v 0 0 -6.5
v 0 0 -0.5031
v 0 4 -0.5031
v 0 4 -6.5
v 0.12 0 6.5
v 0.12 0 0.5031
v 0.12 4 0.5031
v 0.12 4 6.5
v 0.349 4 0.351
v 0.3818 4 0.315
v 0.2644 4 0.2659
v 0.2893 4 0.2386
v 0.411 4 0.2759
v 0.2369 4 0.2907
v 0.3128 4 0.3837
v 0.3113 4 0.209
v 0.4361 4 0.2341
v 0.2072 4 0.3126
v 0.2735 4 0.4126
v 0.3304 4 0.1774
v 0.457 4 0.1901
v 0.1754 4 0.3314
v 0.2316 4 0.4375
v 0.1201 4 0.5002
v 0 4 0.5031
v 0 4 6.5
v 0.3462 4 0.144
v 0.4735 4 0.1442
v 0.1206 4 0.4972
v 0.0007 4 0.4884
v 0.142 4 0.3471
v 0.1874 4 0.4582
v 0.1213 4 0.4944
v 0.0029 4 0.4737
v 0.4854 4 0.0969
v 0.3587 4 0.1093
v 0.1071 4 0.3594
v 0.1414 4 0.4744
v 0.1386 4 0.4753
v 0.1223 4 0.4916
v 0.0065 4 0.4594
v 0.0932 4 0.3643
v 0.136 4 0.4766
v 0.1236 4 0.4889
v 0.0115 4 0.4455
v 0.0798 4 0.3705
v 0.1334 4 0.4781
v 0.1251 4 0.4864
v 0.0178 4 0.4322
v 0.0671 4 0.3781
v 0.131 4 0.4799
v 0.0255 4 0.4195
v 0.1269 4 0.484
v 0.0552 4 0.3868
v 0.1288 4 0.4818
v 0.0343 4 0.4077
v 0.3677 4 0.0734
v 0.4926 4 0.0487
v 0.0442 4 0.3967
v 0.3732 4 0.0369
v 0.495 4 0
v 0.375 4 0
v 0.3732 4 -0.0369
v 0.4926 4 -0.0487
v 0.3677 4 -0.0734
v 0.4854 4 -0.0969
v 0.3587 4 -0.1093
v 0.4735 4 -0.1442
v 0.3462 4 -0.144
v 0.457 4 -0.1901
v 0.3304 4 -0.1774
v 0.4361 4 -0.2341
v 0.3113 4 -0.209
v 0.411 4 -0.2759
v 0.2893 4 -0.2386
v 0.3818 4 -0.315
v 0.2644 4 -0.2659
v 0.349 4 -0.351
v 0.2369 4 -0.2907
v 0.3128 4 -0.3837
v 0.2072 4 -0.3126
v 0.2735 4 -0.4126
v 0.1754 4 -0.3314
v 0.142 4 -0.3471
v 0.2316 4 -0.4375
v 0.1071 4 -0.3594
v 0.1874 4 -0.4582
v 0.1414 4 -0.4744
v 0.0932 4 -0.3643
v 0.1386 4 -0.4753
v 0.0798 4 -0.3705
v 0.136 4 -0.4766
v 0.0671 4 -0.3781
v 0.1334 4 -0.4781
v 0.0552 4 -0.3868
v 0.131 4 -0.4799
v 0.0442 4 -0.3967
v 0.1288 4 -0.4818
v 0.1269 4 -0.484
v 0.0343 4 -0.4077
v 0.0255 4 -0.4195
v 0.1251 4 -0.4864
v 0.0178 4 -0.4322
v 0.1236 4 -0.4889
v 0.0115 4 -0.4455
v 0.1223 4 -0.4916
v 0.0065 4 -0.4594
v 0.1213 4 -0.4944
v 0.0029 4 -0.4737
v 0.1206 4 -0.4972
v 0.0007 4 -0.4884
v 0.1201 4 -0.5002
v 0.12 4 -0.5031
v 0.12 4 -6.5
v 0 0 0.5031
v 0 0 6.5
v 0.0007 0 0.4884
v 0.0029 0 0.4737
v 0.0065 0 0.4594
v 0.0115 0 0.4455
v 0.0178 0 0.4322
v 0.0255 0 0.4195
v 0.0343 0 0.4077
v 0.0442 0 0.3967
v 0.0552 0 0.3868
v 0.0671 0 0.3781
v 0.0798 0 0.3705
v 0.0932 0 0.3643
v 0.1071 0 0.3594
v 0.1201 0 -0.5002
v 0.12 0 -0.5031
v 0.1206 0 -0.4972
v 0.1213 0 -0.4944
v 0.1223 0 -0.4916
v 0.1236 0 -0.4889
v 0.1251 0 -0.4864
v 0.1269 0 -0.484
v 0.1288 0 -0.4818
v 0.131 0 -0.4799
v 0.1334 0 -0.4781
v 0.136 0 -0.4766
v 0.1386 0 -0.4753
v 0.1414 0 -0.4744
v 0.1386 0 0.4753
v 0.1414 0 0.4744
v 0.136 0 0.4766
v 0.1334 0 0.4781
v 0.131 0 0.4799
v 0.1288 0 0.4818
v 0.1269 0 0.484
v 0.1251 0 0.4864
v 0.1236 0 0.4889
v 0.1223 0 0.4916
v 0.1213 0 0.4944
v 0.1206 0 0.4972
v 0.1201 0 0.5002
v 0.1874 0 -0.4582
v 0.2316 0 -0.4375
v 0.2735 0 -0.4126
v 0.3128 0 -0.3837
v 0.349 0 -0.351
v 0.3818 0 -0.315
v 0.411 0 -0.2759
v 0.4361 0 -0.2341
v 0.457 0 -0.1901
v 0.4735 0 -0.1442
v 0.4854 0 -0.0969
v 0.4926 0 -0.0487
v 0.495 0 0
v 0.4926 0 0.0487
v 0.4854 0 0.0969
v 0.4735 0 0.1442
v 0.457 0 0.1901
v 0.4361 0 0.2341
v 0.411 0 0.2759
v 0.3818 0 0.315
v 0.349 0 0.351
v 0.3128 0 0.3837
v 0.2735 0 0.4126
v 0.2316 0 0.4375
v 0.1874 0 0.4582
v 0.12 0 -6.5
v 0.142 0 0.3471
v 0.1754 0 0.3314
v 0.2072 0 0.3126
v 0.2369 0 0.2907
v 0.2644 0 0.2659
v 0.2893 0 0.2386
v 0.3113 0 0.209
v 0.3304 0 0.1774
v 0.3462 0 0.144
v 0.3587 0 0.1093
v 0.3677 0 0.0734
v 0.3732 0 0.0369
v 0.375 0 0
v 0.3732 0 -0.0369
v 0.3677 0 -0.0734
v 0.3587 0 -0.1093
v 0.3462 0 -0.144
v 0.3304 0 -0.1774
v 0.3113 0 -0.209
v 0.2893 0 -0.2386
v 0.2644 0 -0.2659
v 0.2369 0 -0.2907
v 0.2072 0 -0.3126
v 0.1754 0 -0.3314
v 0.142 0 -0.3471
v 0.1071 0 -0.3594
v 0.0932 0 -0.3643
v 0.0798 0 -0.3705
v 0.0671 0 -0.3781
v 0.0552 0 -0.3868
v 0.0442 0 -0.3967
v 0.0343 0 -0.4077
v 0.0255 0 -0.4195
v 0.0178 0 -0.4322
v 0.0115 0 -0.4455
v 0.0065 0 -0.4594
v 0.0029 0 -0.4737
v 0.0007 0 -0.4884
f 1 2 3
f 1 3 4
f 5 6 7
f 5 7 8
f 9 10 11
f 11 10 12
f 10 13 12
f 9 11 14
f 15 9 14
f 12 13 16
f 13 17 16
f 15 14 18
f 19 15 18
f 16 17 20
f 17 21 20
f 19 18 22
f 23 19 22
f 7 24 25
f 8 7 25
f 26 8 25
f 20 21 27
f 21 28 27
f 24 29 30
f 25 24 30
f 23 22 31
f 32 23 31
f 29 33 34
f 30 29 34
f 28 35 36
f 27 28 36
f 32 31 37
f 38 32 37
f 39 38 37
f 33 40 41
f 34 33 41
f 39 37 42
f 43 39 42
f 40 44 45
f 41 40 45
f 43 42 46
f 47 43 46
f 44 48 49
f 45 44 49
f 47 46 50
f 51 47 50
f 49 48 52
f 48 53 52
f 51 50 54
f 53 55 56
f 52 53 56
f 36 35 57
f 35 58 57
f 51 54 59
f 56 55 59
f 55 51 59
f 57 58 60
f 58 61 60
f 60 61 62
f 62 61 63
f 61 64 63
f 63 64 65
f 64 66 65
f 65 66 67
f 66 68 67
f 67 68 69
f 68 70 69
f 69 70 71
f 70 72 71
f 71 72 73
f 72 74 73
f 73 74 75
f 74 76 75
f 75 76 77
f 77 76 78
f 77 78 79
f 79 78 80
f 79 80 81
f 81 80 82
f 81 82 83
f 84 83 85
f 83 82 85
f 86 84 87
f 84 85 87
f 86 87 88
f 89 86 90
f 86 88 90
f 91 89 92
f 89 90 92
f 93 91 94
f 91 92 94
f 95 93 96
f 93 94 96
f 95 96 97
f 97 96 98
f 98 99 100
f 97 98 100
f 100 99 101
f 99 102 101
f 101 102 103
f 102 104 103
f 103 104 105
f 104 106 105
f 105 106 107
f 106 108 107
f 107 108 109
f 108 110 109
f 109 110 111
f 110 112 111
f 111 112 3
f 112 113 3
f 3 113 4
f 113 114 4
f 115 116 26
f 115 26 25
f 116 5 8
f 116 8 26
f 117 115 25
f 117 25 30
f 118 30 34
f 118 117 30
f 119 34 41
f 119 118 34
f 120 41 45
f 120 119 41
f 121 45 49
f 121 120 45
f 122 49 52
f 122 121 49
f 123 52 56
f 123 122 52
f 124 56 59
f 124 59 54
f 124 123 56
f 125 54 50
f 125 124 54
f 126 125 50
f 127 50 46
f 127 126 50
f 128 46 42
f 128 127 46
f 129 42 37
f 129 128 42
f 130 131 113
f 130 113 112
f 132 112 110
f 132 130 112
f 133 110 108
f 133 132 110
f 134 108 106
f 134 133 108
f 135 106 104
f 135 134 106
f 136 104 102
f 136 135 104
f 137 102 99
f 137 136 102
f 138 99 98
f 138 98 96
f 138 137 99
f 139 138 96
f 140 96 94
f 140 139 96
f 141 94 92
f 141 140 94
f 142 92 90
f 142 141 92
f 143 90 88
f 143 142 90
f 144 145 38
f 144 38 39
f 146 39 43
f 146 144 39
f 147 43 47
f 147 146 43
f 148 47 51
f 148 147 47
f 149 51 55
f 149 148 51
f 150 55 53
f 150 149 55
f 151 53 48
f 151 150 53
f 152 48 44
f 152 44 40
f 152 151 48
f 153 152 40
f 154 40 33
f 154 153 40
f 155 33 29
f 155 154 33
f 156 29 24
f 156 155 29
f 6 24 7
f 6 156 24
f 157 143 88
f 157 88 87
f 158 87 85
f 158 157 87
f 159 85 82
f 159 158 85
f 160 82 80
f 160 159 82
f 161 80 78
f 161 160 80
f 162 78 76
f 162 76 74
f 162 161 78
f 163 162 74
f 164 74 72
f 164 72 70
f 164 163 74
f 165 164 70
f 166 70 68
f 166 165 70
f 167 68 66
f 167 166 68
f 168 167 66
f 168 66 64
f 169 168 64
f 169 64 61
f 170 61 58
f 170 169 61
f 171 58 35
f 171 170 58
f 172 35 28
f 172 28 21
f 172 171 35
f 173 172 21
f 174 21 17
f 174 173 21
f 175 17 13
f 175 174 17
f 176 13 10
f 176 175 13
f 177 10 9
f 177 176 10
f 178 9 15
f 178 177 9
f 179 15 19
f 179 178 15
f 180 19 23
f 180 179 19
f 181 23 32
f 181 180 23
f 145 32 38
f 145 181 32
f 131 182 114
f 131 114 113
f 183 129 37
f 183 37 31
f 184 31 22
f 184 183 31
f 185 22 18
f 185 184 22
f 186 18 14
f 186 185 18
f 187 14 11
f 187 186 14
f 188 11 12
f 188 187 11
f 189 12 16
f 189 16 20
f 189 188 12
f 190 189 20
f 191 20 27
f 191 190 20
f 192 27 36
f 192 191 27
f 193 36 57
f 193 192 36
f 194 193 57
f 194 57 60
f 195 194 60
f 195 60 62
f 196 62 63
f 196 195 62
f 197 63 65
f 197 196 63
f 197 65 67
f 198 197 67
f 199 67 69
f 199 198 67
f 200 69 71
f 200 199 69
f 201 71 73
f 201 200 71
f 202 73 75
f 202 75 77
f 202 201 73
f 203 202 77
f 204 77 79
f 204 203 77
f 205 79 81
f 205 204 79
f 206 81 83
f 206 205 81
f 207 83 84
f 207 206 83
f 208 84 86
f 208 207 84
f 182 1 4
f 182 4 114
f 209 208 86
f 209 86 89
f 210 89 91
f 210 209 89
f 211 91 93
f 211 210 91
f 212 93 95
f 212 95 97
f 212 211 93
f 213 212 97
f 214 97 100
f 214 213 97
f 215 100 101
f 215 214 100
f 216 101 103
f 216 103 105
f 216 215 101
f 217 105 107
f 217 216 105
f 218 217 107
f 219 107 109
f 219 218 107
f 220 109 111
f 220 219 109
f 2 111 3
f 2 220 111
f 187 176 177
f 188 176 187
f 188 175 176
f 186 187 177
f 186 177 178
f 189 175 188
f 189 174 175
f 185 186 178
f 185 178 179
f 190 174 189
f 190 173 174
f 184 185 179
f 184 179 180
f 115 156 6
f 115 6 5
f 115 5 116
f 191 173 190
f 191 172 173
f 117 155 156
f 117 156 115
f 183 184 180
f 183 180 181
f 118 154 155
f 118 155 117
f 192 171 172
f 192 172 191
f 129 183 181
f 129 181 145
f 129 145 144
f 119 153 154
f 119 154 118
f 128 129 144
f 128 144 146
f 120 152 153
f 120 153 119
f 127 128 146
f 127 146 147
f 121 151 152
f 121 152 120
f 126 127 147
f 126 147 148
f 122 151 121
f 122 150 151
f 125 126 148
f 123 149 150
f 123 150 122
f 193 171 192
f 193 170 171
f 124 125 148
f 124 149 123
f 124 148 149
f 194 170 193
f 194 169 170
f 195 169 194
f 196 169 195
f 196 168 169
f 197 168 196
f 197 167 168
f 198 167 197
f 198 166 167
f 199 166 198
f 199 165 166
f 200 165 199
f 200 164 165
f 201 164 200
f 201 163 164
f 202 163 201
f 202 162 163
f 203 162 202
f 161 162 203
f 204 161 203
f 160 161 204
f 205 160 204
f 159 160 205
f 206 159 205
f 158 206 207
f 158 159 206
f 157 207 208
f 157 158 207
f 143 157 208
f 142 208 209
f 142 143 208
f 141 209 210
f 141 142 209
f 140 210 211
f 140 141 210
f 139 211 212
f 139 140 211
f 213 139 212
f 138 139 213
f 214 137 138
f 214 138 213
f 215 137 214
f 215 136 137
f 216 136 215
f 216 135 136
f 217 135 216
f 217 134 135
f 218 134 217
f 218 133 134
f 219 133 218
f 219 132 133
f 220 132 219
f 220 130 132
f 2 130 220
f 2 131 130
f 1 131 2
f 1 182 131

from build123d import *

# Parameters (mm, degrees)
EXTRUDE_THIN1_DEPTH = 4


with BuildPart() as part:
    # Sketch2 → Extrude-Thin1 (new body)
    with BuildSketch(Plane(origin=(0, 0, 0), x_dir=(1, 0, 0), z_dir=(0, 1, 0))):
        with BuildLine():
            Line((0, -6.5), (0, -0.503115295))
            ThreePointArc((0, -0.503115295), (0.029732441, -0.413473149), (0.107142857, -0.359368068))
            ThreePointArc((0.107142857, -0.359368068), (0.375, 0), (0.107142857, 0.359368068))
            ThreePointArc((0.107142857, 0.359368068), (0.029732441, 0.413473149), (0, 0.503115295))
            Line((0, 0.503115295), (0, 6.5))
            Line((0, 6.5), (0.12, 6.5))
            Line((0.12, 6.5), (0.12, 0.503115295))
            ThreePointArc((0.12, 0.503115295), (0.125946488, 0.485186866), (0.141428571, 0.47436585))
            ThreePointArc((0.141428571, 0.47436585), (0.495, 0), (0.141428571, -0.47436585))
            ThreePointArc((0.141428571, -0.47436585), (0.125946488, -0.485186866), (0.12, -0.503115295))
            Line((0.12, -0.503115295), (0.12, -6.5))
            Line((0.12, -6.5), (0, -6.5))
        make_face()
    extrude(amount=EXTRUDE_THIN1_DEPTH)


solid = part.part
